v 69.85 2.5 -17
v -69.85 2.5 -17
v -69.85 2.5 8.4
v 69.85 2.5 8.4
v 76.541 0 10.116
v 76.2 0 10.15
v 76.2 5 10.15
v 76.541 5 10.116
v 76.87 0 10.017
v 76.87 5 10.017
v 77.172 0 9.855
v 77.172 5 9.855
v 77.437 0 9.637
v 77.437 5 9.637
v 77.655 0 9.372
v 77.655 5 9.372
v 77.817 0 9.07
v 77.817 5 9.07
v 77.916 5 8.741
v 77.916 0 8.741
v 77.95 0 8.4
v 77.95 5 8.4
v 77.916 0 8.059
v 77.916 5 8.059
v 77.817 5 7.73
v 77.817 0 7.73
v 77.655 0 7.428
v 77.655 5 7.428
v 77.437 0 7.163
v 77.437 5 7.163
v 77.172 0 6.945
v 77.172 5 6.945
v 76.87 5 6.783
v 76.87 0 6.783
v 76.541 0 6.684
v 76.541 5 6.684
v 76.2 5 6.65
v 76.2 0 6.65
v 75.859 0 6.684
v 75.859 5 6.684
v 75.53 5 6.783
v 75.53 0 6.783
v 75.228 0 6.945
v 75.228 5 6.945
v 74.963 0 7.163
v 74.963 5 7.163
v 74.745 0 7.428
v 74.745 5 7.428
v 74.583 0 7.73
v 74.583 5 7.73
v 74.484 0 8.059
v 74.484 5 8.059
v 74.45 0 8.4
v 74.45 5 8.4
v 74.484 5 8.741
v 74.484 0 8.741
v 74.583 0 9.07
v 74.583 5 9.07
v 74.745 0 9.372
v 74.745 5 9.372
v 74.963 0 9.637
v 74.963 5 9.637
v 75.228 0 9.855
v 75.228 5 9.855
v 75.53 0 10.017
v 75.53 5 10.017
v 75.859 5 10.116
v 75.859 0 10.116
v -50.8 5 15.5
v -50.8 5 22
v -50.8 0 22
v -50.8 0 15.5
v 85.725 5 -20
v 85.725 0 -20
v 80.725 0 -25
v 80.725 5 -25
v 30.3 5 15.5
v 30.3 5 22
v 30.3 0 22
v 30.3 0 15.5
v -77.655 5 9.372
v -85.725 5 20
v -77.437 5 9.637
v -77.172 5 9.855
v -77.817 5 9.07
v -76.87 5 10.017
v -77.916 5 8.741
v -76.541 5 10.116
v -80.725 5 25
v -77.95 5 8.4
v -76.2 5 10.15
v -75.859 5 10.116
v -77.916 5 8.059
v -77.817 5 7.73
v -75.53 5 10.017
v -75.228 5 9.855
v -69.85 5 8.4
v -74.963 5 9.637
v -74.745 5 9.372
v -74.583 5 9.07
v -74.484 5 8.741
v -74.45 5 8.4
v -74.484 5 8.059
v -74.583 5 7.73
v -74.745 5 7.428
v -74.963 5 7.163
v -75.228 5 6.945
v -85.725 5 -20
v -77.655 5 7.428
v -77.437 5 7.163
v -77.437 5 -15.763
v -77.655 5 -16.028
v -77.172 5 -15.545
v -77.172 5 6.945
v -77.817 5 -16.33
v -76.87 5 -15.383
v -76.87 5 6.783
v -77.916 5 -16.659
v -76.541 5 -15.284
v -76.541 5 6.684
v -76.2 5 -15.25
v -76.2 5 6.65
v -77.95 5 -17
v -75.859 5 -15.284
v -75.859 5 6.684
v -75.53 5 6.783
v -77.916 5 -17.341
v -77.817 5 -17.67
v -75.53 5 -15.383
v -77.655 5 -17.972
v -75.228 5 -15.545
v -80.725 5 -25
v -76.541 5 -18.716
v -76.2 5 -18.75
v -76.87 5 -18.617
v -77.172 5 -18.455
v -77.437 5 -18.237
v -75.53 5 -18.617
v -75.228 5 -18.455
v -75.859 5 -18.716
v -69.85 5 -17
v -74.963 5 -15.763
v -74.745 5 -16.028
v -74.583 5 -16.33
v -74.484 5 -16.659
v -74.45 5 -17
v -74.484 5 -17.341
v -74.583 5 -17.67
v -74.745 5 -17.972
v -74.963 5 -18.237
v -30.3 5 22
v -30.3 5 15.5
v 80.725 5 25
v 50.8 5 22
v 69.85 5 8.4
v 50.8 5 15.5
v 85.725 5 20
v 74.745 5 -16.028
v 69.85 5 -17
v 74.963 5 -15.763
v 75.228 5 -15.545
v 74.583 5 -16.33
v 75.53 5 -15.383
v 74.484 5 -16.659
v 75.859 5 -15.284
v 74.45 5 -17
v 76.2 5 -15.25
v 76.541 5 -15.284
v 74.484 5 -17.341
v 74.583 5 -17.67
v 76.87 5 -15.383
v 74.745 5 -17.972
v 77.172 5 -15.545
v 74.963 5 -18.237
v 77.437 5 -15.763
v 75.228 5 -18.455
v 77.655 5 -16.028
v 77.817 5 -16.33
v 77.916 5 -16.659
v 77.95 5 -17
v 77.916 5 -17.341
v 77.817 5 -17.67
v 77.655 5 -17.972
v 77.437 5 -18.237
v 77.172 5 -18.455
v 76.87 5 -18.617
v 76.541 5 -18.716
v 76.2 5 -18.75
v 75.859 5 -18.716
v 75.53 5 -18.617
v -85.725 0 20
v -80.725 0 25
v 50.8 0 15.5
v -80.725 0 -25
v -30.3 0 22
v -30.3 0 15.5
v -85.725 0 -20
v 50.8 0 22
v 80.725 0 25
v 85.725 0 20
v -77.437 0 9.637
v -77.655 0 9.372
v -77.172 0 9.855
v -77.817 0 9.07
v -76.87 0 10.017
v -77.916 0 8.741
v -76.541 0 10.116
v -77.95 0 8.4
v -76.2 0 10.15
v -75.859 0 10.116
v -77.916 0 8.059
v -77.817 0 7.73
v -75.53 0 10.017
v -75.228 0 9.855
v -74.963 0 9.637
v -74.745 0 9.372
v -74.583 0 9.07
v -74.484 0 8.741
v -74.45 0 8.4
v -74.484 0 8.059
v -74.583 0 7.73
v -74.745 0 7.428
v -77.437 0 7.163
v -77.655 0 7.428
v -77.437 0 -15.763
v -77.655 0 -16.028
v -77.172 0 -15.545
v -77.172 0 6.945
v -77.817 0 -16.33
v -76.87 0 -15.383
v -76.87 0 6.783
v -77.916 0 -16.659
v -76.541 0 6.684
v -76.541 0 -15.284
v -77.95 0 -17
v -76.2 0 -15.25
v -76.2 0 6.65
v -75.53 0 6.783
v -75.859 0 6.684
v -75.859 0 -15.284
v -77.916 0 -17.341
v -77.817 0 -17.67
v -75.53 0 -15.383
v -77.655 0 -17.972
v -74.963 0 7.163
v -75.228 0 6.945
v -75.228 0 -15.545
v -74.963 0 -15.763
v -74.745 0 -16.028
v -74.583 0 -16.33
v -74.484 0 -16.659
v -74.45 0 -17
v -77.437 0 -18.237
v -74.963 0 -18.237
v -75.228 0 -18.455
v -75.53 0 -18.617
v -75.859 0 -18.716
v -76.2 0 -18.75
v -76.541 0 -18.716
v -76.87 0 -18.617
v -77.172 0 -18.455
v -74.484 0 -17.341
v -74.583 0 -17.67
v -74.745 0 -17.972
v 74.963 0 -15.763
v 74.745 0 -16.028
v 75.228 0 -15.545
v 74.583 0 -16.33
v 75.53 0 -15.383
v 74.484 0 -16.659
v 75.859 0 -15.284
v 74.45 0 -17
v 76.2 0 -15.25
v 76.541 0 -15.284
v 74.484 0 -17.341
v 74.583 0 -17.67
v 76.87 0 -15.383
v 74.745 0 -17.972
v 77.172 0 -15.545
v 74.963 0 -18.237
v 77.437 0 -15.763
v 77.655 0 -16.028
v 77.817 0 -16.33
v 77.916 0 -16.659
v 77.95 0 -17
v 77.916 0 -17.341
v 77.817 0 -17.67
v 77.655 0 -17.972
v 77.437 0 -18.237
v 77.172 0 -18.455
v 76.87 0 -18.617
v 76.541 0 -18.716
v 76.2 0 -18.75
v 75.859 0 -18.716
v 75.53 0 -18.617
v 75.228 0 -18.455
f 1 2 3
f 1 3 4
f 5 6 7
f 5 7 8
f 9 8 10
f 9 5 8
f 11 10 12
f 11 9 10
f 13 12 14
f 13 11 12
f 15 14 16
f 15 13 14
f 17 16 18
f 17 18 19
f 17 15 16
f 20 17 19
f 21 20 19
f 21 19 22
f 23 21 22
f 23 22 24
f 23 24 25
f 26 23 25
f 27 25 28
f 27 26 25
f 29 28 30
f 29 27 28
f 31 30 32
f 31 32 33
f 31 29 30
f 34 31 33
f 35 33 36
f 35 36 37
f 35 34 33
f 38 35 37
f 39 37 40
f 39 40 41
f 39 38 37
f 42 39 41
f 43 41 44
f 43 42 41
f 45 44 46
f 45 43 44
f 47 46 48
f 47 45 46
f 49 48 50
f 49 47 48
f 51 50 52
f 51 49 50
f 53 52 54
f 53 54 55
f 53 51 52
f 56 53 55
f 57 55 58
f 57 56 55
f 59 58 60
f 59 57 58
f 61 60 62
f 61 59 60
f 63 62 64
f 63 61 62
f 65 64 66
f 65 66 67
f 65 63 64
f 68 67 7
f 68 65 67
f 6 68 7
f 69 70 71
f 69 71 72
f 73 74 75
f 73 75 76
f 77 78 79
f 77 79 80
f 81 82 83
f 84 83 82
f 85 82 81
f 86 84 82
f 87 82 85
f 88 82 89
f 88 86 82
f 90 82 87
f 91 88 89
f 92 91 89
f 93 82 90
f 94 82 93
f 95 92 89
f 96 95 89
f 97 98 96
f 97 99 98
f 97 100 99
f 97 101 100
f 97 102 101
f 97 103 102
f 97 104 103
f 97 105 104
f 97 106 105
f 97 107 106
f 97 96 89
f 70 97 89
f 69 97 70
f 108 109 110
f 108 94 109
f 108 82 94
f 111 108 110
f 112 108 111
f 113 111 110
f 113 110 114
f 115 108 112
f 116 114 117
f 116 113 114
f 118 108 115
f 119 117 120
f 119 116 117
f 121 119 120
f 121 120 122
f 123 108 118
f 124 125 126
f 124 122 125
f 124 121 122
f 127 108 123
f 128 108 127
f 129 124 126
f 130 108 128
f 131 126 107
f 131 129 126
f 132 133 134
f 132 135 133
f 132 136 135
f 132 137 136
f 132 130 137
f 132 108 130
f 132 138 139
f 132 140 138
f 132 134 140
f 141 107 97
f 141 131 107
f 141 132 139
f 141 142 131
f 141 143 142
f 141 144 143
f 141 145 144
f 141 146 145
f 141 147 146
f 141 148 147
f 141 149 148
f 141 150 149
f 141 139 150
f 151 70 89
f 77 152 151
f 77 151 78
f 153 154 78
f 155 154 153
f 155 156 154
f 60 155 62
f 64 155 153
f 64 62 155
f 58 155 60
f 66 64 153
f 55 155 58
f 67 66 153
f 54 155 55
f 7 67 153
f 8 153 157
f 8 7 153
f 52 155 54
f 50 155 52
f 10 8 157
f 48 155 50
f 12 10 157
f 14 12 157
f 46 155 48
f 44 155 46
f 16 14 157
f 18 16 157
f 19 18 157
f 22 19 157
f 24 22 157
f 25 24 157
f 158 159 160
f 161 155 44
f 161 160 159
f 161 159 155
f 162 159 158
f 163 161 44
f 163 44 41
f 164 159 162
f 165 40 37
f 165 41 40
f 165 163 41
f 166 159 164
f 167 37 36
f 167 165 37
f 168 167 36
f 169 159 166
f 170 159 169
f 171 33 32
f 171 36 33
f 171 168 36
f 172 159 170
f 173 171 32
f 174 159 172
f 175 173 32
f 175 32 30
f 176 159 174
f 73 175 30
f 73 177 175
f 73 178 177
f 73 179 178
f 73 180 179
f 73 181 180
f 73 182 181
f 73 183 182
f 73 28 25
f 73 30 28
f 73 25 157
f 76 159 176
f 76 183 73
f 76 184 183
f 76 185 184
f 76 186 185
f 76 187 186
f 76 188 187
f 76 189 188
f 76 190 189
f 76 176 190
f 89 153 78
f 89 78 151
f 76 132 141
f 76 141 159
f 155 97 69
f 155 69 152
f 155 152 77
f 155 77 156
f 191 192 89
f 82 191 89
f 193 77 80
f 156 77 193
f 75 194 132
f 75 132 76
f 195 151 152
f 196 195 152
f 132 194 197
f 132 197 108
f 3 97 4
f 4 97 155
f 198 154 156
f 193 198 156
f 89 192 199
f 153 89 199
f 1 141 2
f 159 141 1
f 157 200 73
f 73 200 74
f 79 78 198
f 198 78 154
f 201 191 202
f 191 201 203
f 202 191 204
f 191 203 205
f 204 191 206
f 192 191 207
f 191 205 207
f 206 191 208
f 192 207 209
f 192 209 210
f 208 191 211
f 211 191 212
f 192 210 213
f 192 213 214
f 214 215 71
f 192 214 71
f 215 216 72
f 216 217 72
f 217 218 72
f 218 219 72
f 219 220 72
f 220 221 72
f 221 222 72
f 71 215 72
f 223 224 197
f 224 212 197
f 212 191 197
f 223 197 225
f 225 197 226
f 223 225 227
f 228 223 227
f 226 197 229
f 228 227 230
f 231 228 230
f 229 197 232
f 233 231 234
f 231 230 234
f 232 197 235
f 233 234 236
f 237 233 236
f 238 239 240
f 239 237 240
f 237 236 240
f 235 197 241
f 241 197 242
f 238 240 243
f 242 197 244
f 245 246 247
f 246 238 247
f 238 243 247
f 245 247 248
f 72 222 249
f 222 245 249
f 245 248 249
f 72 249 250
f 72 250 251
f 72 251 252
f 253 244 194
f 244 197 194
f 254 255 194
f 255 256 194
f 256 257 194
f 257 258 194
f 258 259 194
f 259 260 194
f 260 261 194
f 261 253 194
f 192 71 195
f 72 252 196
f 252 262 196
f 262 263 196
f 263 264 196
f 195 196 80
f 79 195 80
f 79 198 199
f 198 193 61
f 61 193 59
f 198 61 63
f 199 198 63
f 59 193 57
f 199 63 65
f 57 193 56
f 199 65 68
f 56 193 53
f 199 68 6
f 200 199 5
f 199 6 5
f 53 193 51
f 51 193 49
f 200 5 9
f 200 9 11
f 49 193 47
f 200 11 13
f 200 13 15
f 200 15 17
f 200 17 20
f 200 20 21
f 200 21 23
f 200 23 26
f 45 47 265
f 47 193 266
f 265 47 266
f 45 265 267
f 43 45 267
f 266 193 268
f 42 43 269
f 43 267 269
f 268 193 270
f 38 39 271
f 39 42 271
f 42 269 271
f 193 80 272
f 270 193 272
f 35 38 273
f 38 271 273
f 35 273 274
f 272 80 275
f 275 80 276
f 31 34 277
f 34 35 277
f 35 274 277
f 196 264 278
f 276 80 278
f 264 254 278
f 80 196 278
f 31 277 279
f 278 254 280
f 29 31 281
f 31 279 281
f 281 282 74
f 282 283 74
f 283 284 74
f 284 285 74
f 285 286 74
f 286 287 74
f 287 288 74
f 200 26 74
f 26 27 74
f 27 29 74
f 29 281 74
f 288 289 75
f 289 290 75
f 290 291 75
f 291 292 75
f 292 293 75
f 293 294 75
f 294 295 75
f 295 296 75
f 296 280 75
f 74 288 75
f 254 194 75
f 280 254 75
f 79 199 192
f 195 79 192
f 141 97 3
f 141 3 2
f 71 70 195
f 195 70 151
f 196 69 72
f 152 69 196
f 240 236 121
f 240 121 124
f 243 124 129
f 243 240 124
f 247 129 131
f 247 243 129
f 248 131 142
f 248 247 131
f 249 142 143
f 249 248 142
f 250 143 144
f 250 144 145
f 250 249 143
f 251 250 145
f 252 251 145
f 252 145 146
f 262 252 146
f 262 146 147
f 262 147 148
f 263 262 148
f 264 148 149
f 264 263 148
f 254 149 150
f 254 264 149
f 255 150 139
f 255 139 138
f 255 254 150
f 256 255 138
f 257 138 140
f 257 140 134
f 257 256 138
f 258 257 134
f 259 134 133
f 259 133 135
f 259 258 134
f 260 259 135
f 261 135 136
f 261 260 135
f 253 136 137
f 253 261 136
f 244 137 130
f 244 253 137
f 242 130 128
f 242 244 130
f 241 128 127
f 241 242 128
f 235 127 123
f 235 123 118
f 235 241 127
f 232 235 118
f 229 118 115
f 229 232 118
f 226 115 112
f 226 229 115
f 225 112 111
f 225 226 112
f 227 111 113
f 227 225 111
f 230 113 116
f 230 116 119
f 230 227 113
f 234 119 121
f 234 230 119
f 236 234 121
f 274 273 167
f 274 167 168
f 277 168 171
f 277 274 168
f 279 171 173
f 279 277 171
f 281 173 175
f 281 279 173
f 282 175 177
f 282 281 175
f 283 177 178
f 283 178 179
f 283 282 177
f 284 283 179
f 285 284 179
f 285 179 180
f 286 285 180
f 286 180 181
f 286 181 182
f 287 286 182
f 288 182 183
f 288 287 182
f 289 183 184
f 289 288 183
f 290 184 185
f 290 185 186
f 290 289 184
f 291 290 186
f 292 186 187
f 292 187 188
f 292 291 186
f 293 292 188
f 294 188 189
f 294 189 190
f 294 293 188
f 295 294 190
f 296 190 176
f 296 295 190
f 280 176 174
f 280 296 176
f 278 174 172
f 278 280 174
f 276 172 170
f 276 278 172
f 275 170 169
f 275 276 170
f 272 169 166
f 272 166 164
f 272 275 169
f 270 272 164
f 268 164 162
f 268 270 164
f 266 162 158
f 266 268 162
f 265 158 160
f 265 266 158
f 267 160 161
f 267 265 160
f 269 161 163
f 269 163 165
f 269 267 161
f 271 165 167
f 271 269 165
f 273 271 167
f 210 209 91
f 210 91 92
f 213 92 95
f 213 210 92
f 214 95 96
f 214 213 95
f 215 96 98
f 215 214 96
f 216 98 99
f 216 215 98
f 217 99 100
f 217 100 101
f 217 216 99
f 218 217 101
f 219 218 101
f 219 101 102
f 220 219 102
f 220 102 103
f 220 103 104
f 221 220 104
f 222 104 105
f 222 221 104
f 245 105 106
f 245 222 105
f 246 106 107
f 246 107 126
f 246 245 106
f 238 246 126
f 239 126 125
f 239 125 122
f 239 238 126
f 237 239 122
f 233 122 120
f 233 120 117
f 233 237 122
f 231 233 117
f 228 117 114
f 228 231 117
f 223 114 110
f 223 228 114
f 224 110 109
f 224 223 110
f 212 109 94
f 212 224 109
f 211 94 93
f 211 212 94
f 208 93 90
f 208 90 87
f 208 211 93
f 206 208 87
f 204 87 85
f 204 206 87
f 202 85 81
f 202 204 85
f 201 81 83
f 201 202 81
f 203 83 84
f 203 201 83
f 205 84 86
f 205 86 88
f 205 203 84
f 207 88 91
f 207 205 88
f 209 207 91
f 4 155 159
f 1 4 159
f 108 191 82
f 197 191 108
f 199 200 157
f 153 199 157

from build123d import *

# Parameters (mm, degrees)
SKETCH1_W           = 171.45
SKETCH1_H           = 50
SKETCH1_R           = 1.75
BOSS_EXTRUDE1_DEPTH = 5
CHAMFER1_SIZE       = 5
SKETCH2_W           = 139.7
SKETCH2_H           = 25.4
CUT_EXTRUDE1_DEPTH  = 2.5
SKETCH3_W           = 20.5
SKETCH3_H           = 6.5
CUT_EXTRUDE2_DEPTH  = 15


with BuildPart() as part:
    # Sketch1 → Boss-Extrude1 (new body)
    with BuildSketch(Plane(origin=(0, 0, 0), x_dir=(1, 0, 0), z_dir=(0, 1, 0))):
        Rectangle(SKETCH1_W, SKETCH1_H)
        with Locations(Location((-76.2, 17, 0), (0, 0, 270))):
            Circle(SKETCH1_R, mode=Mode.SUBTRACT)
        with Locations(Location((76.2, 17, 0), (0, 0, 270))):
            Circle(SKETCH1_R, mode=Mode.SUBTRACT)
        with Locations(Location((-76.2, -8.4, 0), (0, 0, 270))):
            Circle(SKETCH1_R, mode=Mode.SUBTRACT)
        with Locations(Location((76.2, -8.4, 0), (0, 0, 270))):
            Circle(SKETCH1_R, mode=Mode.SUBTRACT)
    extrude(amount=BOSS_EXTRUDE1_DEPTH)

    # Chamfer1
    chamfer1_edges = [part.edges().sort_by_distance(p)[0] for p in [
        (85.725, 2.5, 25),
        (-85.725, 2.5, 25),
        (-85.725, 2.5, -25),
        (85.725, 2.5, -25),
    ]]
    chamfer(chamfer1_edges, length=CHAMFER1_SIZE)

    # Sketch2 → Cut-Extrude1 (cut)
    with BuildSketch(Plane(origin=(0, 5, 0), x_dir=(1, 0, 0), z_dir=(0, 1, 0))):
        with Locations((0, 4.3)):
            Rectangle(SKETCH2_W, SKETCH2_H)
    extrude(amount=-CUT_EXTRUDE1_DEPTH, mode=Mode.SUBTRACT)

    # Sketch3 → Cut-Extrude2 (cut)
    with BuildSketch(Plane(origin=(0, 5, 0), x_dir=(1, 0, 0), z_dir=(0, 1, 0))):
        with Locations((40.55, -18.75)):
            Rectangle(SKETCH3_W, SKETCH3_H)
        with Locations((-40.55, -18.75)):
            Rectangle(SKETCH3_W, SKETCH3_H)
    extrude(amount=-CUT_EXTRUDE2_DEPTH, mode=Mode.SUBTRACT)


solid = part.part
